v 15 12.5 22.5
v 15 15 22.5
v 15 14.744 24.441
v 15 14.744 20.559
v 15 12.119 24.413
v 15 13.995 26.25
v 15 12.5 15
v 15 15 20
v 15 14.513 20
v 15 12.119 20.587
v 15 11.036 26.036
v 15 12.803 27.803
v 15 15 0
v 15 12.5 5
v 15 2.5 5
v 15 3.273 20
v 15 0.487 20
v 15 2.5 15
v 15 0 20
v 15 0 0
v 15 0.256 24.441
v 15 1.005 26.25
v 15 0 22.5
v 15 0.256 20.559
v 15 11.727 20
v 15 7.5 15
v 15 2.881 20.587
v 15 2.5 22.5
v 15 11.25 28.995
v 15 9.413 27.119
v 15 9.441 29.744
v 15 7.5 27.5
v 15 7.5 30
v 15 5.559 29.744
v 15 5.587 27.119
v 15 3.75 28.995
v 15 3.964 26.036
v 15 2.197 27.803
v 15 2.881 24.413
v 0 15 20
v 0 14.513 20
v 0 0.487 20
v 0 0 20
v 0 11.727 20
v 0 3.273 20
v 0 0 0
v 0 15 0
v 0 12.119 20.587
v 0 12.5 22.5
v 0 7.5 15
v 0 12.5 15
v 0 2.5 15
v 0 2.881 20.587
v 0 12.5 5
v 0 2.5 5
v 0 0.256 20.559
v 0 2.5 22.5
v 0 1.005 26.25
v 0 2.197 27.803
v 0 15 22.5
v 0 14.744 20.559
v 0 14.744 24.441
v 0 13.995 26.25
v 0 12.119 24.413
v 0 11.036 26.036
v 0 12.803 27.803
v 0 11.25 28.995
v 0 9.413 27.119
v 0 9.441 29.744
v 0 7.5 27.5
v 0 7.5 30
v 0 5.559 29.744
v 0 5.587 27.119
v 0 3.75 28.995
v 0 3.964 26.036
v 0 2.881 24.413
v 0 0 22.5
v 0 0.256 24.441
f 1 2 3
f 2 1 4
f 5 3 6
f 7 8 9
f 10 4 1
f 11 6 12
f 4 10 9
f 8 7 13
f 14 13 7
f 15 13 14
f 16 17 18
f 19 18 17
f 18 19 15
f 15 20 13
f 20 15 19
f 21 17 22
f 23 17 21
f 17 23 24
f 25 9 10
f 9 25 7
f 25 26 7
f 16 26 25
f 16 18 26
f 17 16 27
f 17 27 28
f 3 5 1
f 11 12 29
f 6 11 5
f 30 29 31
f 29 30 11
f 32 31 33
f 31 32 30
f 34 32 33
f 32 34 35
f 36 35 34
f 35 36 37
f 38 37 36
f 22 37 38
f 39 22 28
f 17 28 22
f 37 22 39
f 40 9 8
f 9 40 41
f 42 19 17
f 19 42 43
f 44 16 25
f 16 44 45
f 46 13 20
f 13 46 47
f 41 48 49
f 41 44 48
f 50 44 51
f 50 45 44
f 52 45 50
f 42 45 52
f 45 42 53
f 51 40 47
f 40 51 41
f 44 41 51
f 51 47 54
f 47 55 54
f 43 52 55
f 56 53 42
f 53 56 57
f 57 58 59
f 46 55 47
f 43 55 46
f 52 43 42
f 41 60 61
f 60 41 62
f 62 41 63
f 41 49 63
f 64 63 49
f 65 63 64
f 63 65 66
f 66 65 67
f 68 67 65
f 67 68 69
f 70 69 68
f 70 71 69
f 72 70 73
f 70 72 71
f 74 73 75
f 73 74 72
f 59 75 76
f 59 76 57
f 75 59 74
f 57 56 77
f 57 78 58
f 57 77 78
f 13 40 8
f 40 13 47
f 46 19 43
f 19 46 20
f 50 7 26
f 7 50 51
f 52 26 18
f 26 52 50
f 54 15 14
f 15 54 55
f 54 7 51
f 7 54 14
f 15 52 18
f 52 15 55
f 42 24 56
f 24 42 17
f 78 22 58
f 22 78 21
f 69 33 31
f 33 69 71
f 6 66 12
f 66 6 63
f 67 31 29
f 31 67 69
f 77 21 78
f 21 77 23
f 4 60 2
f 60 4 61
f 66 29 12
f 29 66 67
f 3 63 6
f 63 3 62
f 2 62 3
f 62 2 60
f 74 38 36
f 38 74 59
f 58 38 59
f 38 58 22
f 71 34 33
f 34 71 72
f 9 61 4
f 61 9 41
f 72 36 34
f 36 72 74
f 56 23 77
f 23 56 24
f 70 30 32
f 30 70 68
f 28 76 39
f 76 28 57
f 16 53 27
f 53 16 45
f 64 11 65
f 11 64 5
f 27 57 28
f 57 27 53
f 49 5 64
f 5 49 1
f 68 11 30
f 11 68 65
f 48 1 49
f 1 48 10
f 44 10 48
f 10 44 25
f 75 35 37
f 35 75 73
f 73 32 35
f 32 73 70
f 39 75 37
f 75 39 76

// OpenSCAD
lng = 15 ;
lrg =15 ;

difference () {
cube (size=[lng,lrg,20]) ;
translate([0,2.5,5])  cube (size=[lng,10,10])  ;
}


difference() {
translate([0,lrg/2,20+lrg/2-5]) rotate([0,90,0]) {
cylinder ( h=lng, d=lrg) ;
}
translate([0,lrg/2,20+lrg/2-5]) rotate([0,90,0]) {
color("red") cylinder ( h=lng, d=lrg-5) ;
}
}
